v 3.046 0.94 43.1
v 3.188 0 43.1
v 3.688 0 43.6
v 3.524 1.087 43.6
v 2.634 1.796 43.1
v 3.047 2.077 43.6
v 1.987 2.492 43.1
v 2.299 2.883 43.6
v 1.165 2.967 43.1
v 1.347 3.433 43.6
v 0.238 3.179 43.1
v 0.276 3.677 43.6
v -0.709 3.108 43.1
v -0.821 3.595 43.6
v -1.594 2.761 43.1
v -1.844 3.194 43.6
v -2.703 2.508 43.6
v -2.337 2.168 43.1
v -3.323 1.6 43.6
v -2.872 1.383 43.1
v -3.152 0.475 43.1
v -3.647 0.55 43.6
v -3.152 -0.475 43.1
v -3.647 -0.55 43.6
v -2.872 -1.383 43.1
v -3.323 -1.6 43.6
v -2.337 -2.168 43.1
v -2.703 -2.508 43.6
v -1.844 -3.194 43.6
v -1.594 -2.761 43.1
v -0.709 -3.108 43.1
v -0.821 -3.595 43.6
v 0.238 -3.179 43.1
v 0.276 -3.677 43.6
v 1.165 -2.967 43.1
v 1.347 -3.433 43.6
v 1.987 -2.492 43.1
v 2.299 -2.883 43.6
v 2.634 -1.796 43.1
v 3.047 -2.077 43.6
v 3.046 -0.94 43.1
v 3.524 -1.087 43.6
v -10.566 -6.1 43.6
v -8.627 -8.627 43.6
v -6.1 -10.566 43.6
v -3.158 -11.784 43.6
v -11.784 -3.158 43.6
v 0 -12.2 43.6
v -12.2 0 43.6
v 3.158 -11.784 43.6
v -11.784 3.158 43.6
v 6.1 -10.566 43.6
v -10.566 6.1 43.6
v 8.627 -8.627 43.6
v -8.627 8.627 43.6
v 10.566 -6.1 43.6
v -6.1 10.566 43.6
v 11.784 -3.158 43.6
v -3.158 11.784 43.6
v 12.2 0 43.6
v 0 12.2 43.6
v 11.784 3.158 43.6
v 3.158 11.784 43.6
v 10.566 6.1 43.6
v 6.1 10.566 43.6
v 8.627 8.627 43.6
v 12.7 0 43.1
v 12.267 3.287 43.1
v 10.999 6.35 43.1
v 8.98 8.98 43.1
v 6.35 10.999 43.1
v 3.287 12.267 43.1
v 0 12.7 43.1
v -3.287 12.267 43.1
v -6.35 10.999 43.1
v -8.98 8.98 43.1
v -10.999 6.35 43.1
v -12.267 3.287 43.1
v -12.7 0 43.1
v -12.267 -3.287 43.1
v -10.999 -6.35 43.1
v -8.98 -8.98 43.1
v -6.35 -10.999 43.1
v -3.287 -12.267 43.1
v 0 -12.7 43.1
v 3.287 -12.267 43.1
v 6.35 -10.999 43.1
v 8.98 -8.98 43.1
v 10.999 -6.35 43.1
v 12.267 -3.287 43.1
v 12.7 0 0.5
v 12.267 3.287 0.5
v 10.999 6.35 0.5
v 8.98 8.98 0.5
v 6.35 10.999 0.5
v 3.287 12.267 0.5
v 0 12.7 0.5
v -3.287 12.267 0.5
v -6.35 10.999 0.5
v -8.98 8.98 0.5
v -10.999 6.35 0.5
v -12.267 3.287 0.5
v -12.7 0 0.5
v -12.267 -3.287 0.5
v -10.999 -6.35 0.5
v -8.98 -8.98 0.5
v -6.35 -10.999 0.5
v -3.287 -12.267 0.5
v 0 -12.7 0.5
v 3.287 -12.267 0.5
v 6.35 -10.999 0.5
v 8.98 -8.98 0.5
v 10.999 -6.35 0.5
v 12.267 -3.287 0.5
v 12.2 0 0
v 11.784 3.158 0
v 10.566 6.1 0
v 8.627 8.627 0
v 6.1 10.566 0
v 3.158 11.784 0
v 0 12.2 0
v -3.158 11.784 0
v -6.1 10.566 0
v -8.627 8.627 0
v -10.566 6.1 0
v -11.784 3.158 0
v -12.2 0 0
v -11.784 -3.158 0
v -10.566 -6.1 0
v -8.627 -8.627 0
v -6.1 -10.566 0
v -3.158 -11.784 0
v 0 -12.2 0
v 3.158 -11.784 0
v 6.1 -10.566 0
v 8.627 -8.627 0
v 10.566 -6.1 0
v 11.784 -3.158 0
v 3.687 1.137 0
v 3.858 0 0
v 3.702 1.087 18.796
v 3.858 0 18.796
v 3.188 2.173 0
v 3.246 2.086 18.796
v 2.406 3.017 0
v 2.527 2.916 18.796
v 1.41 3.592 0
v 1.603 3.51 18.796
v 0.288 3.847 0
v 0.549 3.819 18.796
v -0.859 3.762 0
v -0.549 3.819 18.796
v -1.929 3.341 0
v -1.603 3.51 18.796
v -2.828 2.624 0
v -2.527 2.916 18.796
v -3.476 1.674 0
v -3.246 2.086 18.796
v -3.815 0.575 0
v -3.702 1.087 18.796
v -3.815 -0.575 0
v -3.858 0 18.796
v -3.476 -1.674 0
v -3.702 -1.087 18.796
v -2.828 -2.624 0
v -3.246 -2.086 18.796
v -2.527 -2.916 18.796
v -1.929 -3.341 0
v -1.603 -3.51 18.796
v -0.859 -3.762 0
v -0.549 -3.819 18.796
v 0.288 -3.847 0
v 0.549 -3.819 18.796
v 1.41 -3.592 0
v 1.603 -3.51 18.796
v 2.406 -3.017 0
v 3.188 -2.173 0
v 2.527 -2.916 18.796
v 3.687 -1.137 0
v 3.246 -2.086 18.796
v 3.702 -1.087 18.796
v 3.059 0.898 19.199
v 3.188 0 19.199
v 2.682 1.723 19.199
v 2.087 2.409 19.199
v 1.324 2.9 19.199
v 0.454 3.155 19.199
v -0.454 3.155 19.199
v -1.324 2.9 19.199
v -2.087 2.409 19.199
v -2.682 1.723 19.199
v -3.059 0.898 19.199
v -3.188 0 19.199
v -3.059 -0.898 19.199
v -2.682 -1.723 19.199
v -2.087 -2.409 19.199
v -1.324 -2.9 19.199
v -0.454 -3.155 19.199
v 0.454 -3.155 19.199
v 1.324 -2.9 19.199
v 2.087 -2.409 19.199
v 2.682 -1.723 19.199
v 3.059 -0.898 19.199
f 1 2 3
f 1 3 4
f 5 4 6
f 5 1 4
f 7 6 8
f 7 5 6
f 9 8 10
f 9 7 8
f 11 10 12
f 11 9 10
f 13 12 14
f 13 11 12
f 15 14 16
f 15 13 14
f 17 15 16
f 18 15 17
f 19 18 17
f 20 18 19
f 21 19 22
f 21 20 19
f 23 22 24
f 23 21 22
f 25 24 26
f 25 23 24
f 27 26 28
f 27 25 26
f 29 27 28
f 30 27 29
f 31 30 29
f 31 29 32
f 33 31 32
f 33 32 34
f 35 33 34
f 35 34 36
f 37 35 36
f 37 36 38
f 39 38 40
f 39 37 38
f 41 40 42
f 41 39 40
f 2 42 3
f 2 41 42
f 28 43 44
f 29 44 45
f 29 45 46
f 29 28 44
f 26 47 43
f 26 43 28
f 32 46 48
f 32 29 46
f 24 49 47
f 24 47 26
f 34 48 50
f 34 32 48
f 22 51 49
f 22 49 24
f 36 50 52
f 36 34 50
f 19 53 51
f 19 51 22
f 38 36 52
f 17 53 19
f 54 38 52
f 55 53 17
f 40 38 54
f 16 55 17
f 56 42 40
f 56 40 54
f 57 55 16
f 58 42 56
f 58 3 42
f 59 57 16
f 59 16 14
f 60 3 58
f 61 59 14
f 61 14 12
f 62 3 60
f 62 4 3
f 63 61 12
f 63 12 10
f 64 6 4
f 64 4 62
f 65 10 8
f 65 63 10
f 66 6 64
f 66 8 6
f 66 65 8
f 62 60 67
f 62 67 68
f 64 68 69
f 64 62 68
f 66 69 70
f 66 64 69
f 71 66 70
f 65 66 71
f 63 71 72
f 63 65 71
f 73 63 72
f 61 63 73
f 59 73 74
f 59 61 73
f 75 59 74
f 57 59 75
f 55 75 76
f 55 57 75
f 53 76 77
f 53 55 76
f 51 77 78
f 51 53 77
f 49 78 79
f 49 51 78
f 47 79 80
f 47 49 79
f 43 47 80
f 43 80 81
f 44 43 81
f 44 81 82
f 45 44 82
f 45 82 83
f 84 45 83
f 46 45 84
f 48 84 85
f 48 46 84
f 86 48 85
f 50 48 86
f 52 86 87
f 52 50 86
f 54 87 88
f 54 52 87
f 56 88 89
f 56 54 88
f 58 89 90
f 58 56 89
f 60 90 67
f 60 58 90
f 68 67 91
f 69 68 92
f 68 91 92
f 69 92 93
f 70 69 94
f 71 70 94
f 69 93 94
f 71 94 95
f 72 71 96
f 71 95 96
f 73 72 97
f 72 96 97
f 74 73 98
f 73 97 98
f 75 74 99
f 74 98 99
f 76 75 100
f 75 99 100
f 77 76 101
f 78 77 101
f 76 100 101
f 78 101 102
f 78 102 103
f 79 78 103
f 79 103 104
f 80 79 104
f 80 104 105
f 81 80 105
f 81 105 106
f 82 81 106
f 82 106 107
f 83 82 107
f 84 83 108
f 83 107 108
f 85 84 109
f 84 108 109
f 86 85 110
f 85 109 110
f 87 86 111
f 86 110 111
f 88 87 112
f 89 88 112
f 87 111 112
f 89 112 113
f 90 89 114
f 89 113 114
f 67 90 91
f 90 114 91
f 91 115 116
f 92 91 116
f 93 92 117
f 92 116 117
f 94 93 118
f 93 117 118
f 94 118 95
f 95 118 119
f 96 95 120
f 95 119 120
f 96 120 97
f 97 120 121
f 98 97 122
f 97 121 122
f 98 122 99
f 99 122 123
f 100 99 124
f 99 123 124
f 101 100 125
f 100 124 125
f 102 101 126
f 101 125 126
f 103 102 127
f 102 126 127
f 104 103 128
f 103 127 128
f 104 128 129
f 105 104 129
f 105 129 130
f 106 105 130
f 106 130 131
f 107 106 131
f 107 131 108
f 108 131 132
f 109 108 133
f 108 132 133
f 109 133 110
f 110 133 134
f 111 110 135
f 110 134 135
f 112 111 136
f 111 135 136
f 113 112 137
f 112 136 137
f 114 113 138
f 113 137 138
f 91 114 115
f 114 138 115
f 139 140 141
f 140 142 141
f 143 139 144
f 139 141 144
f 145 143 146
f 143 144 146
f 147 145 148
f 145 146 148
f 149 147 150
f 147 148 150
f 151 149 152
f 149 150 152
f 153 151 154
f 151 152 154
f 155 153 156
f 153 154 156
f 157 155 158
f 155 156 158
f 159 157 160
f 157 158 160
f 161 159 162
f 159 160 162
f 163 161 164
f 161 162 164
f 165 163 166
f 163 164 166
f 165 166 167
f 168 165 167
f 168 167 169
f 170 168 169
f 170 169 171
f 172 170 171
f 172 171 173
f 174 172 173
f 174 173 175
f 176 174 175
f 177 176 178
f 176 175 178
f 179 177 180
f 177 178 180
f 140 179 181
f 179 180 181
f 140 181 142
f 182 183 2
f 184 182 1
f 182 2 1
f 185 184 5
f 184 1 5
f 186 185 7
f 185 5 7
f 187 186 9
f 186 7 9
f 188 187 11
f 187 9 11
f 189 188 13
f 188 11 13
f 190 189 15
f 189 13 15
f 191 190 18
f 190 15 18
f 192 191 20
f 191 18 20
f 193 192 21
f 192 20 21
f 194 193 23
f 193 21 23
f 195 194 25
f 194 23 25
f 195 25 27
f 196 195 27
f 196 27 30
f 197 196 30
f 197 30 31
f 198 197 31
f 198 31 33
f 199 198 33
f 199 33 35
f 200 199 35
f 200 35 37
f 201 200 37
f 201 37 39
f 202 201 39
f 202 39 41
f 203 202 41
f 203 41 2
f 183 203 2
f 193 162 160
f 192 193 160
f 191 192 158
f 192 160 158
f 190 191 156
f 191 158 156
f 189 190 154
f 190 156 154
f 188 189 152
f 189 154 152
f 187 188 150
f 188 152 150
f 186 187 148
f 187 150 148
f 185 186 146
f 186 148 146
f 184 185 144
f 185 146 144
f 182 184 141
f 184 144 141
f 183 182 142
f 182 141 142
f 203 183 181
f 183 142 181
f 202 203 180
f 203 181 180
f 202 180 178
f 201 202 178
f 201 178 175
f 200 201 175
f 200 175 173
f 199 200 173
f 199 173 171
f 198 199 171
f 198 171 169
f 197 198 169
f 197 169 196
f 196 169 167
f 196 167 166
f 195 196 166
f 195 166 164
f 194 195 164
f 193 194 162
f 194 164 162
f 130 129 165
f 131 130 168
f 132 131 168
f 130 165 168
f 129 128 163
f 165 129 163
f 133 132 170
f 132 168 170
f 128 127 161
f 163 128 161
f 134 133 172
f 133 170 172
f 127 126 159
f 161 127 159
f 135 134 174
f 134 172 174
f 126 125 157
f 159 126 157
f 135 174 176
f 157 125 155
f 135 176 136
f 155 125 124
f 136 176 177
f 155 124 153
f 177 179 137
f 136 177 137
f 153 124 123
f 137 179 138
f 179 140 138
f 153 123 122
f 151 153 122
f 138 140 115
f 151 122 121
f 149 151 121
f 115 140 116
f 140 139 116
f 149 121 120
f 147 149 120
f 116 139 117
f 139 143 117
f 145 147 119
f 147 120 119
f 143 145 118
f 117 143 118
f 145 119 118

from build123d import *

# Parameters (mm, degrees)
SKETCH1_R                          = 12.7
BOSS_EXTRUDE1_DEPTH                = 43.6
SKETCH2_R                          = 3.1877
CUT_EXTRUDE1_DEPTH                 = 48.154427152
F_5_16_0_3125_DIAMETER_HOLE1_D     = 7.71652
F_5_16_0_3125_DIAMETER_HOLE1_DEPTH = 18.796
F_5_16_0_3125_DIAMETER_HOLE1_TIP   = 2.318276492
CHAMFER1_SIZE                      = 0.5
CHAMFER2_SIZE                      = 0.5


with BuildPart() as part:
    # Sketch1 → Boss-Extrude1 (new body)
    with BuildSketch(Plane.XY):
        Circle(SKETCH1_R)
    extrude(amount=BOSS_EXTRUDE1_DEPTH)

    # Sketch2 → Cut-Extrude1 (cut, through all)
    with BuildSketch(Plane.XY.offset(43.6)):
        Circle(SKETCH2_R)
    extrude(amount=-CUT_EXTRUDE1_DEPTH, mode=Mode.SUBTRACT)

    # 5/16 (0.3125) Diameter Hole1
    with Locations(Plane(origin=(0, 0, 0), x_dir=(-1, 0, 0), z_dir=(0, 0, -1))):
        with Locations((0, 0)):
            Hole(F_5_16_0_3125_DIAMETER_HOLE1_D / 2, depth=F_5_16_0_3125_DIAMETER_HOLE1_DEPTH)
            with Locations((0, 0, -(F_5_16_0_3125_DIAMETER_HOLE1_DEPTH + F_5_16_0_3125_DIAMETER_HOLE1_TIP / 2))):  # 118° drill point
                Cone(0, F_5_16_0_3125_DIAMETER_HOLE1_D / 2, F_5_16_0_3125_DIAMETER_HOLE1_TIP, mode=Mode.SUBTRACT)

    # Chamfer1
    chamfer1_edges = [part.edges().sort_by_distance(p)[0] for p in [
        (-12.7, 0, 0),
        (-12.7, 0, 43.6),
    ]]
    chamfer(chamfer1_edges, length=CHAMFER1_SIZE)

    # Chamfer2
    chamfer2_edges = [part.edges().sort_by_distance(p)[0] for p in [
        (-3.1877, 0, 43.6),
    ]]
    chamfer(chamfer2_edges, length=CHAMFER2_SIZE)


solid = part.part
